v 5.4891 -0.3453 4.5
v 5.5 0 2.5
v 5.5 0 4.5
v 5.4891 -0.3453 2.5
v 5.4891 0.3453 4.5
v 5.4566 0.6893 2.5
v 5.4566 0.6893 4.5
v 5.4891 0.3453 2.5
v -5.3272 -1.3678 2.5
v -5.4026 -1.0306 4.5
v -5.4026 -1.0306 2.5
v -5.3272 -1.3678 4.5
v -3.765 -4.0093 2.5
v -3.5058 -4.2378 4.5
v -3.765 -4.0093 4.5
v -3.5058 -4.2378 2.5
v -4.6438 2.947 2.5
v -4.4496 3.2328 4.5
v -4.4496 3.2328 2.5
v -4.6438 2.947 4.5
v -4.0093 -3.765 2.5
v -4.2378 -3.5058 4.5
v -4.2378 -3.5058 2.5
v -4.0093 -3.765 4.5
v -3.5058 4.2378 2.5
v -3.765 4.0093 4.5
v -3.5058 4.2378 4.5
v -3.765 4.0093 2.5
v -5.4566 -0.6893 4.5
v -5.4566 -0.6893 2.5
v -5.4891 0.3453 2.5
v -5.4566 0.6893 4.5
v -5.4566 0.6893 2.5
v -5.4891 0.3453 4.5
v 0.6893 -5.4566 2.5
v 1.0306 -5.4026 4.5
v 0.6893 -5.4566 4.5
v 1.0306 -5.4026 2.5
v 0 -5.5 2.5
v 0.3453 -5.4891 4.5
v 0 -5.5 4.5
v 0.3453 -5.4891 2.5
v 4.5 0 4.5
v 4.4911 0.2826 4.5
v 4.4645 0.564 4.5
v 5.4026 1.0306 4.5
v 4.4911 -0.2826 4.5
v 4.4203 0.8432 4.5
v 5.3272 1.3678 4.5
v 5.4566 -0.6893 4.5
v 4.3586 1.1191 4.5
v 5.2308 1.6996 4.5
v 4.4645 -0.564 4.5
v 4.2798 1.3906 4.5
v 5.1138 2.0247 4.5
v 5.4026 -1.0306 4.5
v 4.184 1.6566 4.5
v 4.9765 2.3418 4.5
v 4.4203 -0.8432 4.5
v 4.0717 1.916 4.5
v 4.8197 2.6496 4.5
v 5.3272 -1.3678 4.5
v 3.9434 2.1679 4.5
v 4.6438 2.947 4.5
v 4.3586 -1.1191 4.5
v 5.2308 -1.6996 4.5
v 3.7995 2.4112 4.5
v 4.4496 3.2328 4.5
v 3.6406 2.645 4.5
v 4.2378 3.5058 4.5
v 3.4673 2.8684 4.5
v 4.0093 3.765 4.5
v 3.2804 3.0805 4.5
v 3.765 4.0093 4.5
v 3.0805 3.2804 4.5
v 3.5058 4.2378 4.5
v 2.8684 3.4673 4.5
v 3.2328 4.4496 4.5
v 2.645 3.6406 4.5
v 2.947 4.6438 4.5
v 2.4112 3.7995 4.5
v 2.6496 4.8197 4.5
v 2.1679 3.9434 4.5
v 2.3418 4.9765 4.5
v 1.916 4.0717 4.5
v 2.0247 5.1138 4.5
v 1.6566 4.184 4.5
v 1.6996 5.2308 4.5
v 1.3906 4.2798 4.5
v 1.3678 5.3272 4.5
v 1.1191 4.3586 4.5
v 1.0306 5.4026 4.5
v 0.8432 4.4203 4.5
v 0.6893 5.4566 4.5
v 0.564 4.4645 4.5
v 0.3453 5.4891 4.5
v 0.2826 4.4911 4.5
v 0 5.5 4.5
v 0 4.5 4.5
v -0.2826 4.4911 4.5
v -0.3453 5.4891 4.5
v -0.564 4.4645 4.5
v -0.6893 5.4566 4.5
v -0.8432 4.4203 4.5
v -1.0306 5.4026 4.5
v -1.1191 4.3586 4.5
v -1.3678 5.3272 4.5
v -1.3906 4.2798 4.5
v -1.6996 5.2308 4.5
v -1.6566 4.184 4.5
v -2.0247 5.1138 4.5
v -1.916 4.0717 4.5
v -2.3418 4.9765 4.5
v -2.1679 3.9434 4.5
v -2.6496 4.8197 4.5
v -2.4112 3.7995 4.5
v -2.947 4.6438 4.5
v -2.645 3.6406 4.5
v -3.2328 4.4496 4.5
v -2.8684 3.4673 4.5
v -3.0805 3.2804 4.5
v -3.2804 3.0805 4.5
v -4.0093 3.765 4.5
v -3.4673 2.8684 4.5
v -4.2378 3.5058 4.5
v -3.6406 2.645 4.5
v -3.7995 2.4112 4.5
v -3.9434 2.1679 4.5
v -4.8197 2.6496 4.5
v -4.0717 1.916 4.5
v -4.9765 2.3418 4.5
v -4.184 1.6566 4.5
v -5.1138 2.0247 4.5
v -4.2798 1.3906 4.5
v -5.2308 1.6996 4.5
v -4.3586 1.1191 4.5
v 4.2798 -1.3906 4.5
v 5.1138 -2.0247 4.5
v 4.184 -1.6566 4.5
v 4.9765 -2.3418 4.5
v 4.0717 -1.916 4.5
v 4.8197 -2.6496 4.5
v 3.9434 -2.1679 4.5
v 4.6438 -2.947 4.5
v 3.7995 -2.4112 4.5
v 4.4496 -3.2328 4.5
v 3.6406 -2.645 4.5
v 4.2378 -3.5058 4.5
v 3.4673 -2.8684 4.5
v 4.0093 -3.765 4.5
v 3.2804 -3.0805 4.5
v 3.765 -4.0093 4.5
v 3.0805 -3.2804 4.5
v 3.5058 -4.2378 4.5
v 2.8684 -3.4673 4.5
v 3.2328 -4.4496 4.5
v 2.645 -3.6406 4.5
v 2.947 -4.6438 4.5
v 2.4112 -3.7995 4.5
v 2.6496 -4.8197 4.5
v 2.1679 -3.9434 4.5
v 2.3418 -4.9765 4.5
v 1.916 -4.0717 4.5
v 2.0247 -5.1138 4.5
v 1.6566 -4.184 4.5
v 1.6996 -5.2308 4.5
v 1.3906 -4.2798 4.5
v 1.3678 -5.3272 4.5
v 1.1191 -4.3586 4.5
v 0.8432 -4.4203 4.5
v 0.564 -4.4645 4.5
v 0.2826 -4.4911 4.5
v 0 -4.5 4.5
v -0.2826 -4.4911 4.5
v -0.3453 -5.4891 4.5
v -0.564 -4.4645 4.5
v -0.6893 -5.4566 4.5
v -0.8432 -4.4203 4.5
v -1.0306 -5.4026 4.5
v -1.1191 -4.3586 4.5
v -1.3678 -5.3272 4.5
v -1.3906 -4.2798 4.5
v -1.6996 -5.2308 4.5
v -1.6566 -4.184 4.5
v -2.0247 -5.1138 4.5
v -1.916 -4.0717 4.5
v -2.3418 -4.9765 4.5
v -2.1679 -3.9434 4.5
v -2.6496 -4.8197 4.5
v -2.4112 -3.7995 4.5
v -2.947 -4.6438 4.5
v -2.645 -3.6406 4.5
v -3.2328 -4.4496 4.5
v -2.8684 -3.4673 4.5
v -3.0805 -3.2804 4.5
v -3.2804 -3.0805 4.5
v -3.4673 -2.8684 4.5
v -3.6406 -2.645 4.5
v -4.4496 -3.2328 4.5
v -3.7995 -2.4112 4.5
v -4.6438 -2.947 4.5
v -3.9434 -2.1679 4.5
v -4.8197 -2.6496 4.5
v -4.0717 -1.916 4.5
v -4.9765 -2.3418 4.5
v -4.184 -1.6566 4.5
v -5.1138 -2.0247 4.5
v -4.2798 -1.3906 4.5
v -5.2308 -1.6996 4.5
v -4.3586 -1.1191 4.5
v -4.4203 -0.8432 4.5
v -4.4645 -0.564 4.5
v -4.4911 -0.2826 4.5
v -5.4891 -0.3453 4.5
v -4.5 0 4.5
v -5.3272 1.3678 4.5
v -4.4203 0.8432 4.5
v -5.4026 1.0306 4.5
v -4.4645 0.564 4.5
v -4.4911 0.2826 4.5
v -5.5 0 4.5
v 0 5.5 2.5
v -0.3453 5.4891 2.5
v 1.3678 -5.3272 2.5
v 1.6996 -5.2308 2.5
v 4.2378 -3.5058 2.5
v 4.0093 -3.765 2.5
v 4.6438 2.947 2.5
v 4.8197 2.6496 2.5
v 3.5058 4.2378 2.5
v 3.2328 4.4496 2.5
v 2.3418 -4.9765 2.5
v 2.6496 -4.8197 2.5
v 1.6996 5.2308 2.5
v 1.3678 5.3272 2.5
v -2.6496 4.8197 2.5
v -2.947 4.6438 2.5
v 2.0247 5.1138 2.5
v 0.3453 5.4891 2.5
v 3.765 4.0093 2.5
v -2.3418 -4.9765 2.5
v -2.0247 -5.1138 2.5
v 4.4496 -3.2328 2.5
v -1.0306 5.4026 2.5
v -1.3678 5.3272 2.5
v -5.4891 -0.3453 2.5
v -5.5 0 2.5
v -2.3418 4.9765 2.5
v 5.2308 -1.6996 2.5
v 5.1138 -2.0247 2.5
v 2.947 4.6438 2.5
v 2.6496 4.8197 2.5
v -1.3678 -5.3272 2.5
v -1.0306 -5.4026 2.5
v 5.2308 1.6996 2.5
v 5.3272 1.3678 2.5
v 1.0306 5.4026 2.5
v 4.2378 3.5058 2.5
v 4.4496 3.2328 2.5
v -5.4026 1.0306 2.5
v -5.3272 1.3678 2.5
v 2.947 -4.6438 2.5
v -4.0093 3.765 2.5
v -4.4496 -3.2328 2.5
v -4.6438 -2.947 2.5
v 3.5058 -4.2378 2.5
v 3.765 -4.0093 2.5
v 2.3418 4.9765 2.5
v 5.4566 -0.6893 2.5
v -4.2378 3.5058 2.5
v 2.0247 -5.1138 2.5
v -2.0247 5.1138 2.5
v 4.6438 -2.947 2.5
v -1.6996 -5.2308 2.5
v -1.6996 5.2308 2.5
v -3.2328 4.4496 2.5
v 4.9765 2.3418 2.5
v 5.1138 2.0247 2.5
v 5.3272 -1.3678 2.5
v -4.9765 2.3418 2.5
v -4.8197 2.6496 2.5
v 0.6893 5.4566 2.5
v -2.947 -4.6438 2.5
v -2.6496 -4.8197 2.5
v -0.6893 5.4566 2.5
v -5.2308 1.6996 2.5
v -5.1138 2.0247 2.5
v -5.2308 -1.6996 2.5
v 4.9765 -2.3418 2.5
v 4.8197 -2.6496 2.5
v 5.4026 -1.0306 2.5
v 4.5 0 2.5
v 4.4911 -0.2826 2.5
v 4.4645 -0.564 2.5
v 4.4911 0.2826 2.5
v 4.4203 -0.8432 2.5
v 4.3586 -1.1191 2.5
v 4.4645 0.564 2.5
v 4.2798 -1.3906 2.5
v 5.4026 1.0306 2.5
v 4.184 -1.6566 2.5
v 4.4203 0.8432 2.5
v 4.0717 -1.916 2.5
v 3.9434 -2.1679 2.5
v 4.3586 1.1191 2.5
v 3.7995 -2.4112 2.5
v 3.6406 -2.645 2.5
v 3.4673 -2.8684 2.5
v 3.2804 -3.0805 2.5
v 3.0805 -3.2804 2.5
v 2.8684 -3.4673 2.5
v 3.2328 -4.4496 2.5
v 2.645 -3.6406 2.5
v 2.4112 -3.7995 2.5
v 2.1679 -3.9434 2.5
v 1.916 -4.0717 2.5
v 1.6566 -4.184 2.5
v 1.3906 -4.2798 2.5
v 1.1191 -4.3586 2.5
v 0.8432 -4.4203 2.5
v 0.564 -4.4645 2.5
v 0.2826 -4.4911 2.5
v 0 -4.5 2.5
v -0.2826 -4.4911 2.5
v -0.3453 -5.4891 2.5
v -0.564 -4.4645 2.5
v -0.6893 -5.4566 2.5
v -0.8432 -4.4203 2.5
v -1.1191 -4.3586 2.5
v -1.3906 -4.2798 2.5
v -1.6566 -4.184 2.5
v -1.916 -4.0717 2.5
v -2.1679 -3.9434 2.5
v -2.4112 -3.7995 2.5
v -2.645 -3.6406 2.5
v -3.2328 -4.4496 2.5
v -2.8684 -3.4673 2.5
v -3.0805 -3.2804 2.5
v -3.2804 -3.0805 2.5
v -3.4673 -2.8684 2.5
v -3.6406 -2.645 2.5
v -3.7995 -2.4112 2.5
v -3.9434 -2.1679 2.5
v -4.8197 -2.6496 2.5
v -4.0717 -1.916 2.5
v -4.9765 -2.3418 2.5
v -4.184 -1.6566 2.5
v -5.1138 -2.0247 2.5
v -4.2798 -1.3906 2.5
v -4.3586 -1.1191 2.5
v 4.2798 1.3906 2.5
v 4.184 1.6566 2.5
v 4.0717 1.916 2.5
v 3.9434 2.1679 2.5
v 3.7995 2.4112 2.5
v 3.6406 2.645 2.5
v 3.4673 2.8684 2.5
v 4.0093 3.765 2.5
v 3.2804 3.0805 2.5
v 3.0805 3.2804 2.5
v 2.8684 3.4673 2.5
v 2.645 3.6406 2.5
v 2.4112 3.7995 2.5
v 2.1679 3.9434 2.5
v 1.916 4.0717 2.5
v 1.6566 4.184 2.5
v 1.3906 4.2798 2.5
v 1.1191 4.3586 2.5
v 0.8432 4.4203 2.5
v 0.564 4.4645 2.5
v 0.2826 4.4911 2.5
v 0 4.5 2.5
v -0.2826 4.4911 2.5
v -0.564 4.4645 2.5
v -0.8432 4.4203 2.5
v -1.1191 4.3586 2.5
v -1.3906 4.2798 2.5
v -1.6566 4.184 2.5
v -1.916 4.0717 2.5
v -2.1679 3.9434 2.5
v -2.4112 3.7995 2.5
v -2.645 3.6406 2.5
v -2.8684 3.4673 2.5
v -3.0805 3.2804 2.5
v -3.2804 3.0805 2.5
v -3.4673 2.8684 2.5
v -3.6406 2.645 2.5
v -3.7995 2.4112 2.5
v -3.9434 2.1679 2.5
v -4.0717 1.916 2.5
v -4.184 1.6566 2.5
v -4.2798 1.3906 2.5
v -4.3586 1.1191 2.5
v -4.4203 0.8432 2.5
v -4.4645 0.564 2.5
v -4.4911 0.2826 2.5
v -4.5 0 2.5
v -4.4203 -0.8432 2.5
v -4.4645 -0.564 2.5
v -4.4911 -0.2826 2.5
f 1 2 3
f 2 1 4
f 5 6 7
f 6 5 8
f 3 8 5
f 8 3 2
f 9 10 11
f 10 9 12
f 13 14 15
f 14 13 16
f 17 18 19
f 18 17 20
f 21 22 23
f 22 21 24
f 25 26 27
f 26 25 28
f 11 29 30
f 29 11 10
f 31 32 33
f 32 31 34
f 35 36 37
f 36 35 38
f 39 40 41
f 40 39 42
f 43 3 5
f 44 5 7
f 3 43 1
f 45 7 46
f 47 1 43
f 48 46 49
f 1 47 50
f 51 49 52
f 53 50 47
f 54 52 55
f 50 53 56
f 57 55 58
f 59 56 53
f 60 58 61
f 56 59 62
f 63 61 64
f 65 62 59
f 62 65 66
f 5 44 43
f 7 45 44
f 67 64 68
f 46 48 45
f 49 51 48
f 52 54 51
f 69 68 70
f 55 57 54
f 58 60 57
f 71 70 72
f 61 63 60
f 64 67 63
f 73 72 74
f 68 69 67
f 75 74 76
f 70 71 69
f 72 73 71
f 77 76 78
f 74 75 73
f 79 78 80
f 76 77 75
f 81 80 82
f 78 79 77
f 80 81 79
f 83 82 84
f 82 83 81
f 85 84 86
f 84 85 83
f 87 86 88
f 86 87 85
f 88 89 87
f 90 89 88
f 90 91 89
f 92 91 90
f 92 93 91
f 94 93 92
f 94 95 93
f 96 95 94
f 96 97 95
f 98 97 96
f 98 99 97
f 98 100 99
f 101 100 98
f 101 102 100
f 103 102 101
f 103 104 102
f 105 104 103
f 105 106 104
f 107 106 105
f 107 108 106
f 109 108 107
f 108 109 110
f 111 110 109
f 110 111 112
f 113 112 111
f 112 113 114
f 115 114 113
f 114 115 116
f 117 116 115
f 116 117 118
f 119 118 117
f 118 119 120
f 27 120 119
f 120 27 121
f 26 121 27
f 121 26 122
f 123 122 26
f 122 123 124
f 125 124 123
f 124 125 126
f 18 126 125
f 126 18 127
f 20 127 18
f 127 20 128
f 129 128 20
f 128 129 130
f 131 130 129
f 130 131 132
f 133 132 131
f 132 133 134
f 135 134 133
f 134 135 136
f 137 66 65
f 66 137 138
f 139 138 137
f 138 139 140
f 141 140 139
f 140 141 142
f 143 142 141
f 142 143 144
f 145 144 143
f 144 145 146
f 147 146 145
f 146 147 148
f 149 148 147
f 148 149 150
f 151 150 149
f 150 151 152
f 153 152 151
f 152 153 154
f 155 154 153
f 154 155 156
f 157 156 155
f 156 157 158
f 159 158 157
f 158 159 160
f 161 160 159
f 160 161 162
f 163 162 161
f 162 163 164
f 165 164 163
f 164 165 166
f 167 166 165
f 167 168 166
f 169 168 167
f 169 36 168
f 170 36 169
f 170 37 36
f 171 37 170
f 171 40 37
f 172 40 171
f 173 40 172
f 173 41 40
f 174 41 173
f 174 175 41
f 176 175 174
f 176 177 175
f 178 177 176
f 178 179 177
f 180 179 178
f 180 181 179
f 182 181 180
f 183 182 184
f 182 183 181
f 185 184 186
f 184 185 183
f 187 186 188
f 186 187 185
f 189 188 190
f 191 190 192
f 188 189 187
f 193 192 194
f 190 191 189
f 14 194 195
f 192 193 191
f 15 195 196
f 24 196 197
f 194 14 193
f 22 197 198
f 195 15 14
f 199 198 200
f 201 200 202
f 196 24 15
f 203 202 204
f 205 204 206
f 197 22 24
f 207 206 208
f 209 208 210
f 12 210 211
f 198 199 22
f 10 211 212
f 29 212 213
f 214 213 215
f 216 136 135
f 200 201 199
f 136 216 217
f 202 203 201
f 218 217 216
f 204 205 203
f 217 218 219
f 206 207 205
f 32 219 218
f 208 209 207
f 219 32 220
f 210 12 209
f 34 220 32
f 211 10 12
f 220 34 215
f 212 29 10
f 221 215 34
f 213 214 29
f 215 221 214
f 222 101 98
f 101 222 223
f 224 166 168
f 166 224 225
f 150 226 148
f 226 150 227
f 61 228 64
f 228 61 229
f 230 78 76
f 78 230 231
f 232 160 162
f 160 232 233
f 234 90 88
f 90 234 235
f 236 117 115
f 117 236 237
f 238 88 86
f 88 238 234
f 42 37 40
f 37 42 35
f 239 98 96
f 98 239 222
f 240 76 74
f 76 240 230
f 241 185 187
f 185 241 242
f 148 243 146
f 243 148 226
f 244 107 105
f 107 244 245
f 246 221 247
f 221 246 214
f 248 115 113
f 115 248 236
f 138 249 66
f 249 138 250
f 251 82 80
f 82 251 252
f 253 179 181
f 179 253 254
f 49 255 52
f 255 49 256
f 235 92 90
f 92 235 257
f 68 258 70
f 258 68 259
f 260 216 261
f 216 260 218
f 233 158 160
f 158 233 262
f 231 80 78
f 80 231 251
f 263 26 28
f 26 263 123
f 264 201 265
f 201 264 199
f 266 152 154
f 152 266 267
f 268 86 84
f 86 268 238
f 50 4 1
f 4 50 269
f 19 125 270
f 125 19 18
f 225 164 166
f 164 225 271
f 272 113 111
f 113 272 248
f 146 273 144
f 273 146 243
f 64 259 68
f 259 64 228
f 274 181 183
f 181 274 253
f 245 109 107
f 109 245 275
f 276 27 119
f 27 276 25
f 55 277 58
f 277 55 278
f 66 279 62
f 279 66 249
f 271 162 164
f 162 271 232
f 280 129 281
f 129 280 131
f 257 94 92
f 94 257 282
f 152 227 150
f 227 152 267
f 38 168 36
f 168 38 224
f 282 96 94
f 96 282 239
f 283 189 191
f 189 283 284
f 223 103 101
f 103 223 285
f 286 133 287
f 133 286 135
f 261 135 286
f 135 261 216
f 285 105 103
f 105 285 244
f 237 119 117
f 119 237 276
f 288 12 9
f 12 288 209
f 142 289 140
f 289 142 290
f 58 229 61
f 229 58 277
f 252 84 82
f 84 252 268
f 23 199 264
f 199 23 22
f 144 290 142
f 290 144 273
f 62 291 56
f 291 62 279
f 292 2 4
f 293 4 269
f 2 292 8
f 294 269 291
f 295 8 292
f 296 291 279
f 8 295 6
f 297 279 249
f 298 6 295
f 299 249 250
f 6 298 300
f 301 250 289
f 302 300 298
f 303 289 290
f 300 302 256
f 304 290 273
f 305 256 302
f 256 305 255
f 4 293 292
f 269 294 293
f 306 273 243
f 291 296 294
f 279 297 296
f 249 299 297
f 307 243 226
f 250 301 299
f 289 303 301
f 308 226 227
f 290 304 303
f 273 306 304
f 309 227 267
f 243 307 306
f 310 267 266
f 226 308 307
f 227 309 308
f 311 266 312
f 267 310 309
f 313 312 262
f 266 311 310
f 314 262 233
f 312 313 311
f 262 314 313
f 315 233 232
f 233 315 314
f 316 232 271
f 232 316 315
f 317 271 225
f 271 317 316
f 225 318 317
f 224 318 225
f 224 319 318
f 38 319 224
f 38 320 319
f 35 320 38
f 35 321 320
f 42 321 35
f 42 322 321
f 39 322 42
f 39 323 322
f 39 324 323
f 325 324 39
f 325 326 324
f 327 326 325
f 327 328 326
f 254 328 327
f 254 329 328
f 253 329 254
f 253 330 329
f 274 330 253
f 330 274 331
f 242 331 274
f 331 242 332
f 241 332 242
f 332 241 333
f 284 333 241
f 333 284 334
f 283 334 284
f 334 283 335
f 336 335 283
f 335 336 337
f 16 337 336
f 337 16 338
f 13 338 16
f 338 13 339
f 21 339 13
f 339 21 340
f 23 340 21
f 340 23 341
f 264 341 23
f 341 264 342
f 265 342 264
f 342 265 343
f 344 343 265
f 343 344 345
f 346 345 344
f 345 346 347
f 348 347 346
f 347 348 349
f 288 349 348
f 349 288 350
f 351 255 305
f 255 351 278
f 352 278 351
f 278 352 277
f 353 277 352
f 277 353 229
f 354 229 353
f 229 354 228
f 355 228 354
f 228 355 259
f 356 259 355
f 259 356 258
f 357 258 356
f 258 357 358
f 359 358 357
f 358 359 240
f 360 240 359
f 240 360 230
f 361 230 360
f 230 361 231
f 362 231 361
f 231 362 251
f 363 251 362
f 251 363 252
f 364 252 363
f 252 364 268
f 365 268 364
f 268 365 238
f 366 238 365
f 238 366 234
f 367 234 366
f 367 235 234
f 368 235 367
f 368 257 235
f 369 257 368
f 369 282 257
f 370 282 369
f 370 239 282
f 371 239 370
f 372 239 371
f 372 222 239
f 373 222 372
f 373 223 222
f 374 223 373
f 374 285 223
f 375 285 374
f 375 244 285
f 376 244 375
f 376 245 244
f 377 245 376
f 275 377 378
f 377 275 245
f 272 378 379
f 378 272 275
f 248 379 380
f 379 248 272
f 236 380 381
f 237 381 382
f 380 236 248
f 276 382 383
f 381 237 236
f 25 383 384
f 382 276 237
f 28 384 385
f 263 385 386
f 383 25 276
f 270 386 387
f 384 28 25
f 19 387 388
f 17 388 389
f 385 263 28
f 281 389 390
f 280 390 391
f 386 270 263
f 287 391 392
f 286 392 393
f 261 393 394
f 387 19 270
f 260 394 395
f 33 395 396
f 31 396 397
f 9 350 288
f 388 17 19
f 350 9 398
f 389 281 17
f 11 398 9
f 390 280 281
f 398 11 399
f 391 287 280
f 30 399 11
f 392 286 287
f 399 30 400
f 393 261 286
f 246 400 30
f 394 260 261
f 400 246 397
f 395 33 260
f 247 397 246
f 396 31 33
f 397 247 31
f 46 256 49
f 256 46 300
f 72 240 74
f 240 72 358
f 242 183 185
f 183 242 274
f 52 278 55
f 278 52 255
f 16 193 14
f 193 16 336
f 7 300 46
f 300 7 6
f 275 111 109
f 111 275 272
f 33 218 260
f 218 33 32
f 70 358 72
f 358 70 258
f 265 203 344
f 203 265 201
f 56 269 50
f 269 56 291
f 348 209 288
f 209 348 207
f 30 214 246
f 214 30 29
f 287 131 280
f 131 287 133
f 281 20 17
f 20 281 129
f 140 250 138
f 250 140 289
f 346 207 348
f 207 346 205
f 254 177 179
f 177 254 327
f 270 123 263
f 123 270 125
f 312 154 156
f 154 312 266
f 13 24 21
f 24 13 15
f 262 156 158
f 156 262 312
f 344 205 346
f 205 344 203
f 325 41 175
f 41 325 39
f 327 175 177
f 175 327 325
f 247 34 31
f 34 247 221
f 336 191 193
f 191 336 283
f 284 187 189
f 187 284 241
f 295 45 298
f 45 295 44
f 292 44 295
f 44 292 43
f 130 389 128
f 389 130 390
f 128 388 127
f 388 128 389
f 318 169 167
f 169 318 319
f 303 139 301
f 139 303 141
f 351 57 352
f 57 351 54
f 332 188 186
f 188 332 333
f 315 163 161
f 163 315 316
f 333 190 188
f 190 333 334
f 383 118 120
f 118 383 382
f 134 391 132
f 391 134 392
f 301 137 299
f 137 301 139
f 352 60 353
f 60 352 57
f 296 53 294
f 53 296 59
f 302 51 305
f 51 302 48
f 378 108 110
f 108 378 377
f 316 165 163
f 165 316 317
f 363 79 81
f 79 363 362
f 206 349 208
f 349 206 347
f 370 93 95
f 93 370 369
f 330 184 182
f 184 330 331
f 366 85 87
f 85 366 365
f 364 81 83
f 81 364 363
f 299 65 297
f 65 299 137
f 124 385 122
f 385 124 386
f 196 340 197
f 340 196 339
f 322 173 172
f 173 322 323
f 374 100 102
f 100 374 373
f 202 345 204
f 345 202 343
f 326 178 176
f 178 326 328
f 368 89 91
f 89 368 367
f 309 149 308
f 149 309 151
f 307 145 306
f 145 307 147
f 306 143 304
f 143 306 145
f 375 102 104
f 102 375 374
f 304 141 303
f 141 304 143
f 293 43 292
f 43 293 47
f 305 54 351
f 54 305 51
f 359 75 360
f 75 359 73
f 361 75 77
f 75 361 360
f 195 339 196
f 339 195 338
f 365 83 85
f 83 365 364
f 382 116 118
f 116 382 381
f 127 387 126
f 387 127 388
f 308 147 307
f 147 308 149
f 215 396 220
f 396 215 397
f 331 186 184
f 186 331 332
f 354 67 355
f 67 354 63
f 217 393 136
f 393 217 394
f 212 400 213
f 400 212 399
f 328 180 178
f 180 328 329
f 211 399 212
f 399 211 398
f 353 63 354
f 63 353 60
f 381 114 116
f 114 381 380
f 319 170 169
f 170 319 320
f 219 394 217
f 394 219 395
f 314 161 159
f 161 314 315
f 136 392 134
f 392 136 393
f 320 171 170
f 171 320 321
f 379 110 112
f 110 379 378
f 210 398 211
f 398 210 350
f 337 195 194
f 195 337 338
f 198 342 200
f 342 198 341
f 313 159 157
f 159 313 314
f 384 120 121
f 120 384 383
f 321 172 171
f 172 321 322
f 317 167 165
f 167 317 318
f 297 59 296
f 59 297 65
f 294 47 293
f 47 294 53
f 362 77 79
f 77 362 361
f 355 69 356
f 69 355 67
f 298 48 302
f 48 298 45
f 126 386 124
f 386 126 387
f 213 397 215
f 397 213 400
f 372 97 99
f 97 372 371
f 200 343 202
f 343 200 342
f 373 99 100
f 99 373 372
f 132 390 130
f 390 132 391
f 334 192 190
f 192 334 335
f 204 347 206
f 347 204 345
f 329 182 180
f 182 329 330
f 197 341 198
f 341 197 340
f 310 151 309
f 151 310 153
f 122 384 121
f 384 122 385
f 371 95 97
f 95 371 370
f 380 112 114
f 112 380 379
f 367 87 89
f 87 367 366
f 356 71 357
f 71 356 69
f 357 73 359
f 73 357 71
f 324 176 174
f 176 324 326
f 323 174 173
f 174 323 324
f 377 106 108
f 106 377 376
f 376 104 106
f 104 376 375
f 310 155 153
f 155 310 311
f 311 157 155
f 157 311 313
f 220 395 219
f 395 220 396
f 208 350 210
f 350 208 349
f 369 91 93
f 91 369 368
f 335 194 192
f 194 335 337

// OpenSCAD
// Ankur Gupta
// Feb 2017
// github.com/agupta231

// Setup faces
$fn = 100;

// Parameters
straw_diameter = 5;
straw_connector_bottom_height = 5;
straw_connector_top_height = 3;
straw_connector_thicc = 1;
valve_diameter = 7;
valve_thickness = 2;
ball_diameter = 6;
ball_travel_distance = 1;
valve_connector_height = 2;
valve_height = ball_diameter + ball_travel_distance;
ring_thickness = 2;
ring_height = 2;

// Creating the ring to connect the two valves
translate([0, 0, valve_height / 2]) {
    difference() {
        cylinder(d=valve_thickness + valve_diameter + ring_thickness, h=ring_height, center=true);
        cylinder(d=valve_thickness + valve_diameter, h=ring_height + 1, center=true);
    }
}
